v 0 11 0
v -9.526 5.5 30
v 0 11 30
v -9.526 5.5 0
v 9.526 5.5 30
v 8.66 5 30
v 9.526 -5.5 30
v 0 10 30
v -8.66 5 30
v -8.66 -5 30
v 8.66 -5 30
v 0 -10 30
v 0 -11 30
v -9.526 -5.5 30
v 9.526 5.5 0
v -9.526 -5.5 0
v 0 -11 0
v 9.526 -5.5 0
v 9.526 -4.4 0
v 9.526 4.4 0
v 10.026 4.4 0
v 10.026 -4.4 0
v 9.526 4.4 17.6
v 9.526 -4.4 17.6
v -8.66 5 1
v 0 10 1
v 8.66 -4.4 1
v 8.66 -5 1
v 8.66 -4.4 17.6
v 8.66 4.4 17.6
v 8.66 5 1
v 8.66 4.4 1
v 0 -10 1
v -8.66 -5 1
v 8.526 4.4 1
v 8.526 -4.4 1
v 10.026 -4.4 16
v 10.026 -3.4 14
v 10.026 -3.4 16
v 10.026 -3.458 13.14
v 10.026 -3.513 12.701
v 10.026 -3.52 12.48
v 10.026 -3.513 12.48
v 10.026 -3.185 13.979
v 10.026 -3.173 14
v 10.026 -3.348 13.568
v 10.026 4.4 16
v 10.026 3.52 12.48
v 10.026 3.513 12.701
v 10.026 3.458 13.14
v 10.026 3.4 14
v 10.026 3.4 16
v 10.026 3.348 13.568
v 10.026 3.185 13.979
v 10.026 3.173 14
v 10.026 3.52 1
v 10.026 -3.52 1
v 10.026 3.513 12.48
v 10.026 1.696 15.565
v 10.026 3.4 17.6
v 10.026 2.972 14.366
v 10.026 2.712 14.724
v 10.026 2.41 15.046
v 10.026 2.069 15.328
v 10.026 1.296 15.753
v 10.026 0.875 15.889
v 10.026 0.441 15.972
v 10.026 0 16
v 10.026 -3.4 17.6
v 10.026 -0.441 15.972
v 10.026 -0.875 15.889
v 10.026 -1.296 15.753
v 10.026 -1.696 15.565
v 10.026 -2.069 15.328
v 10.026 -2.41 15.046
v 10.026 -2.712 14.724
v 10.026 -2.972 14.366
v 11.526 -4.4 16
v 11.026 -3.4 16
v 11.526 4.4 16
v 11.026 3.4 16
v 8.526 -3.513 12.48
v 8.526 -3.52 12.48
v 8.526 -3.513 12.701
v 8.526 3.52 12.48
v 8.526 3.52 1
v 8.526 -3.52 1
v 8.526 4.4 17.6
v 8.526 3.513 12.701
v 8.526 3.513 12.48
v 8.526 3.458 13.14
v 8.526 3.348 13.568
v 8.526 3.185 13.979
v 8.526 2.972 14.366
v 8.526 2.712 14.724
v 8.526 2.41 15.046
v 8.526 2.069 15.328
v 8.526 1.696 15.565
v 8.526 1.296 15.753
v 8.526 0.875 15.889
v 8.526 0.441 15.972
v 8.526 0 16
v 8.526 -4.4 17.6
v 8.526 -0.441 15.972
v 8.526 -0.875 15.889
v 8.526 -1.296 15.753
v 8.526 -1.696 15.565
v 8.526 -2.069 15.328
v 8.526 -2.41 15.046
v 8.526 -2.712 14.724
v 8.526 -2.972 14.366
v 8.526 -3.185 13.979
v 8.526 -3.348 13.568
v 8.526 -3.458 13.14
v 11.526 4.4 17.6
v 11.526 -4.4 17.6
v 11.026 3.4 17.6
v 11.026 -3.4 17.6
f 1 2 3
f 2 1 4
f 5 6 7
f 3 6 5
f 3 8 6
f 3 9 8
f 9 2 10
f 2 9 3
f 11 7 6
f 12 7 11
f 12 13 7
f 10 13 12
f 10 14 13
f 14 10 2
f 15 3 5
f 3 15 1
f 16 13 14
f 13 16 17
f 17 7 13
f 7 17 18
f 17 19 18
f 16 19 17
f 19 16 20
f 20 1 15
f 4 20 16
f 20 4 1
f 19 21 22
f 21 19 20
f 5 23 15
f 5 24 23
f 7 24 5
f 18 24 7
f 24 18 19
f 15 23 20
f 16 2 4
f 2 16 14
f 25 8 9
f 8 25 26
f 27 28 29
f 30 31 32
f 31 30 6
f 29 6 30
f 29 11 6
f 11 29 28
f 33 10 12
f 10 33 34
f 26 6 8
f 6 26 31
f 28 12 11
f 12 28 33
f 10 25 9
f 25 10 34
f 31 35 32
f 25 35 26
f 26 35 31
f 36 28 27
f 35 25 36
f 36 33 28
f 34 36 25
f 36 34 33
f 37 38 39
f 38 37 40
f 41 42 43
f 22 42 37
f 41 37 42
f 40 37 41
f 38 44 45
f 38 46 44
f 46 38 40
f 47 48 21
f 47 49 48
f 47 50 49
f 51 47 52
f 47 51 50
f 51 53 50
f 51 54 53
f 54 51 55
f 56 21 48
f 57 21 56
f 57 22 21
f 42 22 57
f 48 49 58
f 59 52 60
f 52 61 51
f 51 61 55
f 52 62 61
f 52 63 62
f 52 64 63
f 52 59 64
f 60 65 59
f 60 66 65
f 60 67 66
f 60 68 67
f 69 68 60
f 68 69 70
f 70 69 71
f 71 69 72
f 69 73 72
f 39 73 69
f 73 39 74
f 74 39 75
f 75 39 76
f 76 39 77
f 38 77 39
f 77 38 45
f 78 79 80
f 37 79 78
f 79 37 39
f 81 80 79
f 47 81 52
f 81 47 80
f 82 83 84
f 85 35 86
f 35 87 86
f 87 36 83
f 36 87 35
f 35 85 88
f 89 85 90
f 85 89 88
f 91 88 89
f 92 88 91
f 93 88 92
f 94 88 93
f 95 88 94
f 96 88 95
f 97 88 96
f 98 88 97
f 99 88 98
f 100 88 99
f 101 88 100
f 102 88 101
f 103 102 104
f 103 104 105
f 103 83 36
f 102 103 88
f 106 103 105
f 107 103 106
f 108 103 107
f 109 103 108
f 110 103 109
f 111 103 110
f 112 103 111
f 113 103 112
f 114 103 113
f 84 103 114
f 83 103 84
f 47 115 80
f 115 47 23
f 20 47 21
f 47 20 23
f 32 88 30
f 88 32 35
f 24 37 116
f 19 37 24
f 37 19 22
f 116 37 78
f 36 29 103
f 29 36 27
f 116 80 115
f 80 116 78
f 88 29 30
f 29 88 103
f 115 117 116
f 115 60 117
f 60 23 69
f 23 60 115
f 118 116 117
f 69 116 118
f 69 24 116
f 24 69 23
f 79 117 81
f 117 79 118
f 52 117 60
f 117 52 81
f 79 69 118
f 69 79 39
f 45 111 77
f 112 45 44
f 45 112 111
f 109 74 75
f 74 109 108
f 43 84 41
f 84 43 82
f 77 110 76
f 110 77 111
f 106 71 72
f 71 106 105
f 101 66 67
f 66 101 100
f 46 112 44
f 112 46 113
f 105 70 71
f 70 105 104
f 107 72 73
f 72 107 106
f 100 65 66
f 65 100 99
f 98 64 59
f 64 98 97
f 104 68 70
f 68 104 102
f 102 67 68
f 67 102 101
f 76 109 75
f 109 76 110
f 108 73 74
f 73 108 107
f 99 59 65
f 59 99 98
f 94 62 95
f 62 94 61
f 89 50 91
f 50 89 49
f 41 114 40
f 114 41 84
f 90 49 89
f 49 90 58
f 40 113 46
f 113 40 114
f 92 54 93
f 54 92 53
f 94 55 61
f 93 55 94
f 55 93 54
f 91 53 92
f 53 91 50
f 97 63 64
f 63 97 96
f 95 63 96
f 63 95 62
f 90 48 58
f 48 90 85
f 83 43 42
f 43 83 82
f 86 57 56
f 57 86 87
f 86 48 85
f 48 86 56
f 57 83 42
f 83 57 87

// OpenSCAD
$fn=10;
turm(11, 30);


module turm(breit, hoch) {
  $fn = 6;
  seite2seite = sqrt(3) * breit;
  eck2eck = breit*2;
  echo (seite2seite, eck2eck);
  seite=breit;
  torbreit = breit - (breit/5);
  torhoch = hoch/2;
  boden = 1;
  difference() {
    union() {
      turmkoerper(breit, hoch, boden);
      translate([seite2seite/2 -1,-torbreit/2,0]) {
        tor(torbreit, torhoch +boden);
      }
      rotate([0,0,30]) {
        translate([-breit/2,(-seite2seite/2)+0.2,0]) {
          mauerstruktur(breit, hoch);
        }
      }
      rotate([0,0,90]) {
        translate([-breit/2,(-seite2seite/2)+0.2,0]) {
          mauerstruktur(breit, hoch);
        }
      }
      rotate([0,0,150]) {
        translate([-breit/2,(-seite2seite/2)+0.2,0]) {
          mauerstruktur(breit, hoch);
        }
      }
      rotate([0,0,210]) {
        translate([-breit/2,(-seite2seite/2)+0.2,0]) {
          mauerstruktur(breit, hoch);
        }
      }
      rotate([0,0,270]) {
        translate([-breit/2,(-seite2seite/2)+0.2,0]) {
          mauerstruktur(breit, hoch);
        }
      }
      rotate([0,0,330]) {
        translate([-breit/2,(-seite2seite/2)+0.2,0]) {
          mauerstruktur(breit, hoch);
        }
      }
    }
    translate([seite2seite/2 -2,0,boden]) {
      toroeffnung(torbreit, torhoch);
    }
  }
  // Mauer
}

module turmkoerper(breit, hoch, boden) {
  difference() {
    //surface("mauer.png", convexity=2) {
    linear_extrude(hoch) {
      rotate([0,0,30]) {
      circle(breit);
      }
    }
  //}
    translate([0,0,boden]) {
      linear_extrude(hoch + boden) {
        rotate([0,0,30]) {
          circle(breit - 1);
        }
      }
    }
  }
}

module tor(torbreit, torhoch) {
  color("Red"){
    translate([0,0,0]) {
      difference() {
        union() {
          cube([1.5, torbreit, torhoch]);
          translate([0,0,torhoch]) {
            cube([3, torbreit, torhoch/10]);
          }
        }
        translate([1.5,1,torhoch -2 ]) {
          cube([1, torbreit-2, (torhoch/10)+4]);
        }
    }
  }
}
}

module toroeffnung(torbreit, torhoch) {
  $fn = 50;
  rundungdm = torbreit/2 -torbreit/10;
  translate([0,0,torhoch-rundungdm]) {
    rotate([0, 90, 0]) {
      linear_extrude(4) {
        circle(rundungdm);
      }
    }
    translate([0,-rundungdm,-torhoch + rundungdm]) {
      cube([4, rundungdm*2, torhoch-rundungdm]);
    }
  }
}


module mauerstruktur(breit, hoch) {
rotate([90,0,0]) {
  mirror([0, 0, 0]) {
    scale([breit / 72, hoch / 108, 1 / 256])
    surface(file = "mauer2.png", convexity = 3);
  }
}


}
